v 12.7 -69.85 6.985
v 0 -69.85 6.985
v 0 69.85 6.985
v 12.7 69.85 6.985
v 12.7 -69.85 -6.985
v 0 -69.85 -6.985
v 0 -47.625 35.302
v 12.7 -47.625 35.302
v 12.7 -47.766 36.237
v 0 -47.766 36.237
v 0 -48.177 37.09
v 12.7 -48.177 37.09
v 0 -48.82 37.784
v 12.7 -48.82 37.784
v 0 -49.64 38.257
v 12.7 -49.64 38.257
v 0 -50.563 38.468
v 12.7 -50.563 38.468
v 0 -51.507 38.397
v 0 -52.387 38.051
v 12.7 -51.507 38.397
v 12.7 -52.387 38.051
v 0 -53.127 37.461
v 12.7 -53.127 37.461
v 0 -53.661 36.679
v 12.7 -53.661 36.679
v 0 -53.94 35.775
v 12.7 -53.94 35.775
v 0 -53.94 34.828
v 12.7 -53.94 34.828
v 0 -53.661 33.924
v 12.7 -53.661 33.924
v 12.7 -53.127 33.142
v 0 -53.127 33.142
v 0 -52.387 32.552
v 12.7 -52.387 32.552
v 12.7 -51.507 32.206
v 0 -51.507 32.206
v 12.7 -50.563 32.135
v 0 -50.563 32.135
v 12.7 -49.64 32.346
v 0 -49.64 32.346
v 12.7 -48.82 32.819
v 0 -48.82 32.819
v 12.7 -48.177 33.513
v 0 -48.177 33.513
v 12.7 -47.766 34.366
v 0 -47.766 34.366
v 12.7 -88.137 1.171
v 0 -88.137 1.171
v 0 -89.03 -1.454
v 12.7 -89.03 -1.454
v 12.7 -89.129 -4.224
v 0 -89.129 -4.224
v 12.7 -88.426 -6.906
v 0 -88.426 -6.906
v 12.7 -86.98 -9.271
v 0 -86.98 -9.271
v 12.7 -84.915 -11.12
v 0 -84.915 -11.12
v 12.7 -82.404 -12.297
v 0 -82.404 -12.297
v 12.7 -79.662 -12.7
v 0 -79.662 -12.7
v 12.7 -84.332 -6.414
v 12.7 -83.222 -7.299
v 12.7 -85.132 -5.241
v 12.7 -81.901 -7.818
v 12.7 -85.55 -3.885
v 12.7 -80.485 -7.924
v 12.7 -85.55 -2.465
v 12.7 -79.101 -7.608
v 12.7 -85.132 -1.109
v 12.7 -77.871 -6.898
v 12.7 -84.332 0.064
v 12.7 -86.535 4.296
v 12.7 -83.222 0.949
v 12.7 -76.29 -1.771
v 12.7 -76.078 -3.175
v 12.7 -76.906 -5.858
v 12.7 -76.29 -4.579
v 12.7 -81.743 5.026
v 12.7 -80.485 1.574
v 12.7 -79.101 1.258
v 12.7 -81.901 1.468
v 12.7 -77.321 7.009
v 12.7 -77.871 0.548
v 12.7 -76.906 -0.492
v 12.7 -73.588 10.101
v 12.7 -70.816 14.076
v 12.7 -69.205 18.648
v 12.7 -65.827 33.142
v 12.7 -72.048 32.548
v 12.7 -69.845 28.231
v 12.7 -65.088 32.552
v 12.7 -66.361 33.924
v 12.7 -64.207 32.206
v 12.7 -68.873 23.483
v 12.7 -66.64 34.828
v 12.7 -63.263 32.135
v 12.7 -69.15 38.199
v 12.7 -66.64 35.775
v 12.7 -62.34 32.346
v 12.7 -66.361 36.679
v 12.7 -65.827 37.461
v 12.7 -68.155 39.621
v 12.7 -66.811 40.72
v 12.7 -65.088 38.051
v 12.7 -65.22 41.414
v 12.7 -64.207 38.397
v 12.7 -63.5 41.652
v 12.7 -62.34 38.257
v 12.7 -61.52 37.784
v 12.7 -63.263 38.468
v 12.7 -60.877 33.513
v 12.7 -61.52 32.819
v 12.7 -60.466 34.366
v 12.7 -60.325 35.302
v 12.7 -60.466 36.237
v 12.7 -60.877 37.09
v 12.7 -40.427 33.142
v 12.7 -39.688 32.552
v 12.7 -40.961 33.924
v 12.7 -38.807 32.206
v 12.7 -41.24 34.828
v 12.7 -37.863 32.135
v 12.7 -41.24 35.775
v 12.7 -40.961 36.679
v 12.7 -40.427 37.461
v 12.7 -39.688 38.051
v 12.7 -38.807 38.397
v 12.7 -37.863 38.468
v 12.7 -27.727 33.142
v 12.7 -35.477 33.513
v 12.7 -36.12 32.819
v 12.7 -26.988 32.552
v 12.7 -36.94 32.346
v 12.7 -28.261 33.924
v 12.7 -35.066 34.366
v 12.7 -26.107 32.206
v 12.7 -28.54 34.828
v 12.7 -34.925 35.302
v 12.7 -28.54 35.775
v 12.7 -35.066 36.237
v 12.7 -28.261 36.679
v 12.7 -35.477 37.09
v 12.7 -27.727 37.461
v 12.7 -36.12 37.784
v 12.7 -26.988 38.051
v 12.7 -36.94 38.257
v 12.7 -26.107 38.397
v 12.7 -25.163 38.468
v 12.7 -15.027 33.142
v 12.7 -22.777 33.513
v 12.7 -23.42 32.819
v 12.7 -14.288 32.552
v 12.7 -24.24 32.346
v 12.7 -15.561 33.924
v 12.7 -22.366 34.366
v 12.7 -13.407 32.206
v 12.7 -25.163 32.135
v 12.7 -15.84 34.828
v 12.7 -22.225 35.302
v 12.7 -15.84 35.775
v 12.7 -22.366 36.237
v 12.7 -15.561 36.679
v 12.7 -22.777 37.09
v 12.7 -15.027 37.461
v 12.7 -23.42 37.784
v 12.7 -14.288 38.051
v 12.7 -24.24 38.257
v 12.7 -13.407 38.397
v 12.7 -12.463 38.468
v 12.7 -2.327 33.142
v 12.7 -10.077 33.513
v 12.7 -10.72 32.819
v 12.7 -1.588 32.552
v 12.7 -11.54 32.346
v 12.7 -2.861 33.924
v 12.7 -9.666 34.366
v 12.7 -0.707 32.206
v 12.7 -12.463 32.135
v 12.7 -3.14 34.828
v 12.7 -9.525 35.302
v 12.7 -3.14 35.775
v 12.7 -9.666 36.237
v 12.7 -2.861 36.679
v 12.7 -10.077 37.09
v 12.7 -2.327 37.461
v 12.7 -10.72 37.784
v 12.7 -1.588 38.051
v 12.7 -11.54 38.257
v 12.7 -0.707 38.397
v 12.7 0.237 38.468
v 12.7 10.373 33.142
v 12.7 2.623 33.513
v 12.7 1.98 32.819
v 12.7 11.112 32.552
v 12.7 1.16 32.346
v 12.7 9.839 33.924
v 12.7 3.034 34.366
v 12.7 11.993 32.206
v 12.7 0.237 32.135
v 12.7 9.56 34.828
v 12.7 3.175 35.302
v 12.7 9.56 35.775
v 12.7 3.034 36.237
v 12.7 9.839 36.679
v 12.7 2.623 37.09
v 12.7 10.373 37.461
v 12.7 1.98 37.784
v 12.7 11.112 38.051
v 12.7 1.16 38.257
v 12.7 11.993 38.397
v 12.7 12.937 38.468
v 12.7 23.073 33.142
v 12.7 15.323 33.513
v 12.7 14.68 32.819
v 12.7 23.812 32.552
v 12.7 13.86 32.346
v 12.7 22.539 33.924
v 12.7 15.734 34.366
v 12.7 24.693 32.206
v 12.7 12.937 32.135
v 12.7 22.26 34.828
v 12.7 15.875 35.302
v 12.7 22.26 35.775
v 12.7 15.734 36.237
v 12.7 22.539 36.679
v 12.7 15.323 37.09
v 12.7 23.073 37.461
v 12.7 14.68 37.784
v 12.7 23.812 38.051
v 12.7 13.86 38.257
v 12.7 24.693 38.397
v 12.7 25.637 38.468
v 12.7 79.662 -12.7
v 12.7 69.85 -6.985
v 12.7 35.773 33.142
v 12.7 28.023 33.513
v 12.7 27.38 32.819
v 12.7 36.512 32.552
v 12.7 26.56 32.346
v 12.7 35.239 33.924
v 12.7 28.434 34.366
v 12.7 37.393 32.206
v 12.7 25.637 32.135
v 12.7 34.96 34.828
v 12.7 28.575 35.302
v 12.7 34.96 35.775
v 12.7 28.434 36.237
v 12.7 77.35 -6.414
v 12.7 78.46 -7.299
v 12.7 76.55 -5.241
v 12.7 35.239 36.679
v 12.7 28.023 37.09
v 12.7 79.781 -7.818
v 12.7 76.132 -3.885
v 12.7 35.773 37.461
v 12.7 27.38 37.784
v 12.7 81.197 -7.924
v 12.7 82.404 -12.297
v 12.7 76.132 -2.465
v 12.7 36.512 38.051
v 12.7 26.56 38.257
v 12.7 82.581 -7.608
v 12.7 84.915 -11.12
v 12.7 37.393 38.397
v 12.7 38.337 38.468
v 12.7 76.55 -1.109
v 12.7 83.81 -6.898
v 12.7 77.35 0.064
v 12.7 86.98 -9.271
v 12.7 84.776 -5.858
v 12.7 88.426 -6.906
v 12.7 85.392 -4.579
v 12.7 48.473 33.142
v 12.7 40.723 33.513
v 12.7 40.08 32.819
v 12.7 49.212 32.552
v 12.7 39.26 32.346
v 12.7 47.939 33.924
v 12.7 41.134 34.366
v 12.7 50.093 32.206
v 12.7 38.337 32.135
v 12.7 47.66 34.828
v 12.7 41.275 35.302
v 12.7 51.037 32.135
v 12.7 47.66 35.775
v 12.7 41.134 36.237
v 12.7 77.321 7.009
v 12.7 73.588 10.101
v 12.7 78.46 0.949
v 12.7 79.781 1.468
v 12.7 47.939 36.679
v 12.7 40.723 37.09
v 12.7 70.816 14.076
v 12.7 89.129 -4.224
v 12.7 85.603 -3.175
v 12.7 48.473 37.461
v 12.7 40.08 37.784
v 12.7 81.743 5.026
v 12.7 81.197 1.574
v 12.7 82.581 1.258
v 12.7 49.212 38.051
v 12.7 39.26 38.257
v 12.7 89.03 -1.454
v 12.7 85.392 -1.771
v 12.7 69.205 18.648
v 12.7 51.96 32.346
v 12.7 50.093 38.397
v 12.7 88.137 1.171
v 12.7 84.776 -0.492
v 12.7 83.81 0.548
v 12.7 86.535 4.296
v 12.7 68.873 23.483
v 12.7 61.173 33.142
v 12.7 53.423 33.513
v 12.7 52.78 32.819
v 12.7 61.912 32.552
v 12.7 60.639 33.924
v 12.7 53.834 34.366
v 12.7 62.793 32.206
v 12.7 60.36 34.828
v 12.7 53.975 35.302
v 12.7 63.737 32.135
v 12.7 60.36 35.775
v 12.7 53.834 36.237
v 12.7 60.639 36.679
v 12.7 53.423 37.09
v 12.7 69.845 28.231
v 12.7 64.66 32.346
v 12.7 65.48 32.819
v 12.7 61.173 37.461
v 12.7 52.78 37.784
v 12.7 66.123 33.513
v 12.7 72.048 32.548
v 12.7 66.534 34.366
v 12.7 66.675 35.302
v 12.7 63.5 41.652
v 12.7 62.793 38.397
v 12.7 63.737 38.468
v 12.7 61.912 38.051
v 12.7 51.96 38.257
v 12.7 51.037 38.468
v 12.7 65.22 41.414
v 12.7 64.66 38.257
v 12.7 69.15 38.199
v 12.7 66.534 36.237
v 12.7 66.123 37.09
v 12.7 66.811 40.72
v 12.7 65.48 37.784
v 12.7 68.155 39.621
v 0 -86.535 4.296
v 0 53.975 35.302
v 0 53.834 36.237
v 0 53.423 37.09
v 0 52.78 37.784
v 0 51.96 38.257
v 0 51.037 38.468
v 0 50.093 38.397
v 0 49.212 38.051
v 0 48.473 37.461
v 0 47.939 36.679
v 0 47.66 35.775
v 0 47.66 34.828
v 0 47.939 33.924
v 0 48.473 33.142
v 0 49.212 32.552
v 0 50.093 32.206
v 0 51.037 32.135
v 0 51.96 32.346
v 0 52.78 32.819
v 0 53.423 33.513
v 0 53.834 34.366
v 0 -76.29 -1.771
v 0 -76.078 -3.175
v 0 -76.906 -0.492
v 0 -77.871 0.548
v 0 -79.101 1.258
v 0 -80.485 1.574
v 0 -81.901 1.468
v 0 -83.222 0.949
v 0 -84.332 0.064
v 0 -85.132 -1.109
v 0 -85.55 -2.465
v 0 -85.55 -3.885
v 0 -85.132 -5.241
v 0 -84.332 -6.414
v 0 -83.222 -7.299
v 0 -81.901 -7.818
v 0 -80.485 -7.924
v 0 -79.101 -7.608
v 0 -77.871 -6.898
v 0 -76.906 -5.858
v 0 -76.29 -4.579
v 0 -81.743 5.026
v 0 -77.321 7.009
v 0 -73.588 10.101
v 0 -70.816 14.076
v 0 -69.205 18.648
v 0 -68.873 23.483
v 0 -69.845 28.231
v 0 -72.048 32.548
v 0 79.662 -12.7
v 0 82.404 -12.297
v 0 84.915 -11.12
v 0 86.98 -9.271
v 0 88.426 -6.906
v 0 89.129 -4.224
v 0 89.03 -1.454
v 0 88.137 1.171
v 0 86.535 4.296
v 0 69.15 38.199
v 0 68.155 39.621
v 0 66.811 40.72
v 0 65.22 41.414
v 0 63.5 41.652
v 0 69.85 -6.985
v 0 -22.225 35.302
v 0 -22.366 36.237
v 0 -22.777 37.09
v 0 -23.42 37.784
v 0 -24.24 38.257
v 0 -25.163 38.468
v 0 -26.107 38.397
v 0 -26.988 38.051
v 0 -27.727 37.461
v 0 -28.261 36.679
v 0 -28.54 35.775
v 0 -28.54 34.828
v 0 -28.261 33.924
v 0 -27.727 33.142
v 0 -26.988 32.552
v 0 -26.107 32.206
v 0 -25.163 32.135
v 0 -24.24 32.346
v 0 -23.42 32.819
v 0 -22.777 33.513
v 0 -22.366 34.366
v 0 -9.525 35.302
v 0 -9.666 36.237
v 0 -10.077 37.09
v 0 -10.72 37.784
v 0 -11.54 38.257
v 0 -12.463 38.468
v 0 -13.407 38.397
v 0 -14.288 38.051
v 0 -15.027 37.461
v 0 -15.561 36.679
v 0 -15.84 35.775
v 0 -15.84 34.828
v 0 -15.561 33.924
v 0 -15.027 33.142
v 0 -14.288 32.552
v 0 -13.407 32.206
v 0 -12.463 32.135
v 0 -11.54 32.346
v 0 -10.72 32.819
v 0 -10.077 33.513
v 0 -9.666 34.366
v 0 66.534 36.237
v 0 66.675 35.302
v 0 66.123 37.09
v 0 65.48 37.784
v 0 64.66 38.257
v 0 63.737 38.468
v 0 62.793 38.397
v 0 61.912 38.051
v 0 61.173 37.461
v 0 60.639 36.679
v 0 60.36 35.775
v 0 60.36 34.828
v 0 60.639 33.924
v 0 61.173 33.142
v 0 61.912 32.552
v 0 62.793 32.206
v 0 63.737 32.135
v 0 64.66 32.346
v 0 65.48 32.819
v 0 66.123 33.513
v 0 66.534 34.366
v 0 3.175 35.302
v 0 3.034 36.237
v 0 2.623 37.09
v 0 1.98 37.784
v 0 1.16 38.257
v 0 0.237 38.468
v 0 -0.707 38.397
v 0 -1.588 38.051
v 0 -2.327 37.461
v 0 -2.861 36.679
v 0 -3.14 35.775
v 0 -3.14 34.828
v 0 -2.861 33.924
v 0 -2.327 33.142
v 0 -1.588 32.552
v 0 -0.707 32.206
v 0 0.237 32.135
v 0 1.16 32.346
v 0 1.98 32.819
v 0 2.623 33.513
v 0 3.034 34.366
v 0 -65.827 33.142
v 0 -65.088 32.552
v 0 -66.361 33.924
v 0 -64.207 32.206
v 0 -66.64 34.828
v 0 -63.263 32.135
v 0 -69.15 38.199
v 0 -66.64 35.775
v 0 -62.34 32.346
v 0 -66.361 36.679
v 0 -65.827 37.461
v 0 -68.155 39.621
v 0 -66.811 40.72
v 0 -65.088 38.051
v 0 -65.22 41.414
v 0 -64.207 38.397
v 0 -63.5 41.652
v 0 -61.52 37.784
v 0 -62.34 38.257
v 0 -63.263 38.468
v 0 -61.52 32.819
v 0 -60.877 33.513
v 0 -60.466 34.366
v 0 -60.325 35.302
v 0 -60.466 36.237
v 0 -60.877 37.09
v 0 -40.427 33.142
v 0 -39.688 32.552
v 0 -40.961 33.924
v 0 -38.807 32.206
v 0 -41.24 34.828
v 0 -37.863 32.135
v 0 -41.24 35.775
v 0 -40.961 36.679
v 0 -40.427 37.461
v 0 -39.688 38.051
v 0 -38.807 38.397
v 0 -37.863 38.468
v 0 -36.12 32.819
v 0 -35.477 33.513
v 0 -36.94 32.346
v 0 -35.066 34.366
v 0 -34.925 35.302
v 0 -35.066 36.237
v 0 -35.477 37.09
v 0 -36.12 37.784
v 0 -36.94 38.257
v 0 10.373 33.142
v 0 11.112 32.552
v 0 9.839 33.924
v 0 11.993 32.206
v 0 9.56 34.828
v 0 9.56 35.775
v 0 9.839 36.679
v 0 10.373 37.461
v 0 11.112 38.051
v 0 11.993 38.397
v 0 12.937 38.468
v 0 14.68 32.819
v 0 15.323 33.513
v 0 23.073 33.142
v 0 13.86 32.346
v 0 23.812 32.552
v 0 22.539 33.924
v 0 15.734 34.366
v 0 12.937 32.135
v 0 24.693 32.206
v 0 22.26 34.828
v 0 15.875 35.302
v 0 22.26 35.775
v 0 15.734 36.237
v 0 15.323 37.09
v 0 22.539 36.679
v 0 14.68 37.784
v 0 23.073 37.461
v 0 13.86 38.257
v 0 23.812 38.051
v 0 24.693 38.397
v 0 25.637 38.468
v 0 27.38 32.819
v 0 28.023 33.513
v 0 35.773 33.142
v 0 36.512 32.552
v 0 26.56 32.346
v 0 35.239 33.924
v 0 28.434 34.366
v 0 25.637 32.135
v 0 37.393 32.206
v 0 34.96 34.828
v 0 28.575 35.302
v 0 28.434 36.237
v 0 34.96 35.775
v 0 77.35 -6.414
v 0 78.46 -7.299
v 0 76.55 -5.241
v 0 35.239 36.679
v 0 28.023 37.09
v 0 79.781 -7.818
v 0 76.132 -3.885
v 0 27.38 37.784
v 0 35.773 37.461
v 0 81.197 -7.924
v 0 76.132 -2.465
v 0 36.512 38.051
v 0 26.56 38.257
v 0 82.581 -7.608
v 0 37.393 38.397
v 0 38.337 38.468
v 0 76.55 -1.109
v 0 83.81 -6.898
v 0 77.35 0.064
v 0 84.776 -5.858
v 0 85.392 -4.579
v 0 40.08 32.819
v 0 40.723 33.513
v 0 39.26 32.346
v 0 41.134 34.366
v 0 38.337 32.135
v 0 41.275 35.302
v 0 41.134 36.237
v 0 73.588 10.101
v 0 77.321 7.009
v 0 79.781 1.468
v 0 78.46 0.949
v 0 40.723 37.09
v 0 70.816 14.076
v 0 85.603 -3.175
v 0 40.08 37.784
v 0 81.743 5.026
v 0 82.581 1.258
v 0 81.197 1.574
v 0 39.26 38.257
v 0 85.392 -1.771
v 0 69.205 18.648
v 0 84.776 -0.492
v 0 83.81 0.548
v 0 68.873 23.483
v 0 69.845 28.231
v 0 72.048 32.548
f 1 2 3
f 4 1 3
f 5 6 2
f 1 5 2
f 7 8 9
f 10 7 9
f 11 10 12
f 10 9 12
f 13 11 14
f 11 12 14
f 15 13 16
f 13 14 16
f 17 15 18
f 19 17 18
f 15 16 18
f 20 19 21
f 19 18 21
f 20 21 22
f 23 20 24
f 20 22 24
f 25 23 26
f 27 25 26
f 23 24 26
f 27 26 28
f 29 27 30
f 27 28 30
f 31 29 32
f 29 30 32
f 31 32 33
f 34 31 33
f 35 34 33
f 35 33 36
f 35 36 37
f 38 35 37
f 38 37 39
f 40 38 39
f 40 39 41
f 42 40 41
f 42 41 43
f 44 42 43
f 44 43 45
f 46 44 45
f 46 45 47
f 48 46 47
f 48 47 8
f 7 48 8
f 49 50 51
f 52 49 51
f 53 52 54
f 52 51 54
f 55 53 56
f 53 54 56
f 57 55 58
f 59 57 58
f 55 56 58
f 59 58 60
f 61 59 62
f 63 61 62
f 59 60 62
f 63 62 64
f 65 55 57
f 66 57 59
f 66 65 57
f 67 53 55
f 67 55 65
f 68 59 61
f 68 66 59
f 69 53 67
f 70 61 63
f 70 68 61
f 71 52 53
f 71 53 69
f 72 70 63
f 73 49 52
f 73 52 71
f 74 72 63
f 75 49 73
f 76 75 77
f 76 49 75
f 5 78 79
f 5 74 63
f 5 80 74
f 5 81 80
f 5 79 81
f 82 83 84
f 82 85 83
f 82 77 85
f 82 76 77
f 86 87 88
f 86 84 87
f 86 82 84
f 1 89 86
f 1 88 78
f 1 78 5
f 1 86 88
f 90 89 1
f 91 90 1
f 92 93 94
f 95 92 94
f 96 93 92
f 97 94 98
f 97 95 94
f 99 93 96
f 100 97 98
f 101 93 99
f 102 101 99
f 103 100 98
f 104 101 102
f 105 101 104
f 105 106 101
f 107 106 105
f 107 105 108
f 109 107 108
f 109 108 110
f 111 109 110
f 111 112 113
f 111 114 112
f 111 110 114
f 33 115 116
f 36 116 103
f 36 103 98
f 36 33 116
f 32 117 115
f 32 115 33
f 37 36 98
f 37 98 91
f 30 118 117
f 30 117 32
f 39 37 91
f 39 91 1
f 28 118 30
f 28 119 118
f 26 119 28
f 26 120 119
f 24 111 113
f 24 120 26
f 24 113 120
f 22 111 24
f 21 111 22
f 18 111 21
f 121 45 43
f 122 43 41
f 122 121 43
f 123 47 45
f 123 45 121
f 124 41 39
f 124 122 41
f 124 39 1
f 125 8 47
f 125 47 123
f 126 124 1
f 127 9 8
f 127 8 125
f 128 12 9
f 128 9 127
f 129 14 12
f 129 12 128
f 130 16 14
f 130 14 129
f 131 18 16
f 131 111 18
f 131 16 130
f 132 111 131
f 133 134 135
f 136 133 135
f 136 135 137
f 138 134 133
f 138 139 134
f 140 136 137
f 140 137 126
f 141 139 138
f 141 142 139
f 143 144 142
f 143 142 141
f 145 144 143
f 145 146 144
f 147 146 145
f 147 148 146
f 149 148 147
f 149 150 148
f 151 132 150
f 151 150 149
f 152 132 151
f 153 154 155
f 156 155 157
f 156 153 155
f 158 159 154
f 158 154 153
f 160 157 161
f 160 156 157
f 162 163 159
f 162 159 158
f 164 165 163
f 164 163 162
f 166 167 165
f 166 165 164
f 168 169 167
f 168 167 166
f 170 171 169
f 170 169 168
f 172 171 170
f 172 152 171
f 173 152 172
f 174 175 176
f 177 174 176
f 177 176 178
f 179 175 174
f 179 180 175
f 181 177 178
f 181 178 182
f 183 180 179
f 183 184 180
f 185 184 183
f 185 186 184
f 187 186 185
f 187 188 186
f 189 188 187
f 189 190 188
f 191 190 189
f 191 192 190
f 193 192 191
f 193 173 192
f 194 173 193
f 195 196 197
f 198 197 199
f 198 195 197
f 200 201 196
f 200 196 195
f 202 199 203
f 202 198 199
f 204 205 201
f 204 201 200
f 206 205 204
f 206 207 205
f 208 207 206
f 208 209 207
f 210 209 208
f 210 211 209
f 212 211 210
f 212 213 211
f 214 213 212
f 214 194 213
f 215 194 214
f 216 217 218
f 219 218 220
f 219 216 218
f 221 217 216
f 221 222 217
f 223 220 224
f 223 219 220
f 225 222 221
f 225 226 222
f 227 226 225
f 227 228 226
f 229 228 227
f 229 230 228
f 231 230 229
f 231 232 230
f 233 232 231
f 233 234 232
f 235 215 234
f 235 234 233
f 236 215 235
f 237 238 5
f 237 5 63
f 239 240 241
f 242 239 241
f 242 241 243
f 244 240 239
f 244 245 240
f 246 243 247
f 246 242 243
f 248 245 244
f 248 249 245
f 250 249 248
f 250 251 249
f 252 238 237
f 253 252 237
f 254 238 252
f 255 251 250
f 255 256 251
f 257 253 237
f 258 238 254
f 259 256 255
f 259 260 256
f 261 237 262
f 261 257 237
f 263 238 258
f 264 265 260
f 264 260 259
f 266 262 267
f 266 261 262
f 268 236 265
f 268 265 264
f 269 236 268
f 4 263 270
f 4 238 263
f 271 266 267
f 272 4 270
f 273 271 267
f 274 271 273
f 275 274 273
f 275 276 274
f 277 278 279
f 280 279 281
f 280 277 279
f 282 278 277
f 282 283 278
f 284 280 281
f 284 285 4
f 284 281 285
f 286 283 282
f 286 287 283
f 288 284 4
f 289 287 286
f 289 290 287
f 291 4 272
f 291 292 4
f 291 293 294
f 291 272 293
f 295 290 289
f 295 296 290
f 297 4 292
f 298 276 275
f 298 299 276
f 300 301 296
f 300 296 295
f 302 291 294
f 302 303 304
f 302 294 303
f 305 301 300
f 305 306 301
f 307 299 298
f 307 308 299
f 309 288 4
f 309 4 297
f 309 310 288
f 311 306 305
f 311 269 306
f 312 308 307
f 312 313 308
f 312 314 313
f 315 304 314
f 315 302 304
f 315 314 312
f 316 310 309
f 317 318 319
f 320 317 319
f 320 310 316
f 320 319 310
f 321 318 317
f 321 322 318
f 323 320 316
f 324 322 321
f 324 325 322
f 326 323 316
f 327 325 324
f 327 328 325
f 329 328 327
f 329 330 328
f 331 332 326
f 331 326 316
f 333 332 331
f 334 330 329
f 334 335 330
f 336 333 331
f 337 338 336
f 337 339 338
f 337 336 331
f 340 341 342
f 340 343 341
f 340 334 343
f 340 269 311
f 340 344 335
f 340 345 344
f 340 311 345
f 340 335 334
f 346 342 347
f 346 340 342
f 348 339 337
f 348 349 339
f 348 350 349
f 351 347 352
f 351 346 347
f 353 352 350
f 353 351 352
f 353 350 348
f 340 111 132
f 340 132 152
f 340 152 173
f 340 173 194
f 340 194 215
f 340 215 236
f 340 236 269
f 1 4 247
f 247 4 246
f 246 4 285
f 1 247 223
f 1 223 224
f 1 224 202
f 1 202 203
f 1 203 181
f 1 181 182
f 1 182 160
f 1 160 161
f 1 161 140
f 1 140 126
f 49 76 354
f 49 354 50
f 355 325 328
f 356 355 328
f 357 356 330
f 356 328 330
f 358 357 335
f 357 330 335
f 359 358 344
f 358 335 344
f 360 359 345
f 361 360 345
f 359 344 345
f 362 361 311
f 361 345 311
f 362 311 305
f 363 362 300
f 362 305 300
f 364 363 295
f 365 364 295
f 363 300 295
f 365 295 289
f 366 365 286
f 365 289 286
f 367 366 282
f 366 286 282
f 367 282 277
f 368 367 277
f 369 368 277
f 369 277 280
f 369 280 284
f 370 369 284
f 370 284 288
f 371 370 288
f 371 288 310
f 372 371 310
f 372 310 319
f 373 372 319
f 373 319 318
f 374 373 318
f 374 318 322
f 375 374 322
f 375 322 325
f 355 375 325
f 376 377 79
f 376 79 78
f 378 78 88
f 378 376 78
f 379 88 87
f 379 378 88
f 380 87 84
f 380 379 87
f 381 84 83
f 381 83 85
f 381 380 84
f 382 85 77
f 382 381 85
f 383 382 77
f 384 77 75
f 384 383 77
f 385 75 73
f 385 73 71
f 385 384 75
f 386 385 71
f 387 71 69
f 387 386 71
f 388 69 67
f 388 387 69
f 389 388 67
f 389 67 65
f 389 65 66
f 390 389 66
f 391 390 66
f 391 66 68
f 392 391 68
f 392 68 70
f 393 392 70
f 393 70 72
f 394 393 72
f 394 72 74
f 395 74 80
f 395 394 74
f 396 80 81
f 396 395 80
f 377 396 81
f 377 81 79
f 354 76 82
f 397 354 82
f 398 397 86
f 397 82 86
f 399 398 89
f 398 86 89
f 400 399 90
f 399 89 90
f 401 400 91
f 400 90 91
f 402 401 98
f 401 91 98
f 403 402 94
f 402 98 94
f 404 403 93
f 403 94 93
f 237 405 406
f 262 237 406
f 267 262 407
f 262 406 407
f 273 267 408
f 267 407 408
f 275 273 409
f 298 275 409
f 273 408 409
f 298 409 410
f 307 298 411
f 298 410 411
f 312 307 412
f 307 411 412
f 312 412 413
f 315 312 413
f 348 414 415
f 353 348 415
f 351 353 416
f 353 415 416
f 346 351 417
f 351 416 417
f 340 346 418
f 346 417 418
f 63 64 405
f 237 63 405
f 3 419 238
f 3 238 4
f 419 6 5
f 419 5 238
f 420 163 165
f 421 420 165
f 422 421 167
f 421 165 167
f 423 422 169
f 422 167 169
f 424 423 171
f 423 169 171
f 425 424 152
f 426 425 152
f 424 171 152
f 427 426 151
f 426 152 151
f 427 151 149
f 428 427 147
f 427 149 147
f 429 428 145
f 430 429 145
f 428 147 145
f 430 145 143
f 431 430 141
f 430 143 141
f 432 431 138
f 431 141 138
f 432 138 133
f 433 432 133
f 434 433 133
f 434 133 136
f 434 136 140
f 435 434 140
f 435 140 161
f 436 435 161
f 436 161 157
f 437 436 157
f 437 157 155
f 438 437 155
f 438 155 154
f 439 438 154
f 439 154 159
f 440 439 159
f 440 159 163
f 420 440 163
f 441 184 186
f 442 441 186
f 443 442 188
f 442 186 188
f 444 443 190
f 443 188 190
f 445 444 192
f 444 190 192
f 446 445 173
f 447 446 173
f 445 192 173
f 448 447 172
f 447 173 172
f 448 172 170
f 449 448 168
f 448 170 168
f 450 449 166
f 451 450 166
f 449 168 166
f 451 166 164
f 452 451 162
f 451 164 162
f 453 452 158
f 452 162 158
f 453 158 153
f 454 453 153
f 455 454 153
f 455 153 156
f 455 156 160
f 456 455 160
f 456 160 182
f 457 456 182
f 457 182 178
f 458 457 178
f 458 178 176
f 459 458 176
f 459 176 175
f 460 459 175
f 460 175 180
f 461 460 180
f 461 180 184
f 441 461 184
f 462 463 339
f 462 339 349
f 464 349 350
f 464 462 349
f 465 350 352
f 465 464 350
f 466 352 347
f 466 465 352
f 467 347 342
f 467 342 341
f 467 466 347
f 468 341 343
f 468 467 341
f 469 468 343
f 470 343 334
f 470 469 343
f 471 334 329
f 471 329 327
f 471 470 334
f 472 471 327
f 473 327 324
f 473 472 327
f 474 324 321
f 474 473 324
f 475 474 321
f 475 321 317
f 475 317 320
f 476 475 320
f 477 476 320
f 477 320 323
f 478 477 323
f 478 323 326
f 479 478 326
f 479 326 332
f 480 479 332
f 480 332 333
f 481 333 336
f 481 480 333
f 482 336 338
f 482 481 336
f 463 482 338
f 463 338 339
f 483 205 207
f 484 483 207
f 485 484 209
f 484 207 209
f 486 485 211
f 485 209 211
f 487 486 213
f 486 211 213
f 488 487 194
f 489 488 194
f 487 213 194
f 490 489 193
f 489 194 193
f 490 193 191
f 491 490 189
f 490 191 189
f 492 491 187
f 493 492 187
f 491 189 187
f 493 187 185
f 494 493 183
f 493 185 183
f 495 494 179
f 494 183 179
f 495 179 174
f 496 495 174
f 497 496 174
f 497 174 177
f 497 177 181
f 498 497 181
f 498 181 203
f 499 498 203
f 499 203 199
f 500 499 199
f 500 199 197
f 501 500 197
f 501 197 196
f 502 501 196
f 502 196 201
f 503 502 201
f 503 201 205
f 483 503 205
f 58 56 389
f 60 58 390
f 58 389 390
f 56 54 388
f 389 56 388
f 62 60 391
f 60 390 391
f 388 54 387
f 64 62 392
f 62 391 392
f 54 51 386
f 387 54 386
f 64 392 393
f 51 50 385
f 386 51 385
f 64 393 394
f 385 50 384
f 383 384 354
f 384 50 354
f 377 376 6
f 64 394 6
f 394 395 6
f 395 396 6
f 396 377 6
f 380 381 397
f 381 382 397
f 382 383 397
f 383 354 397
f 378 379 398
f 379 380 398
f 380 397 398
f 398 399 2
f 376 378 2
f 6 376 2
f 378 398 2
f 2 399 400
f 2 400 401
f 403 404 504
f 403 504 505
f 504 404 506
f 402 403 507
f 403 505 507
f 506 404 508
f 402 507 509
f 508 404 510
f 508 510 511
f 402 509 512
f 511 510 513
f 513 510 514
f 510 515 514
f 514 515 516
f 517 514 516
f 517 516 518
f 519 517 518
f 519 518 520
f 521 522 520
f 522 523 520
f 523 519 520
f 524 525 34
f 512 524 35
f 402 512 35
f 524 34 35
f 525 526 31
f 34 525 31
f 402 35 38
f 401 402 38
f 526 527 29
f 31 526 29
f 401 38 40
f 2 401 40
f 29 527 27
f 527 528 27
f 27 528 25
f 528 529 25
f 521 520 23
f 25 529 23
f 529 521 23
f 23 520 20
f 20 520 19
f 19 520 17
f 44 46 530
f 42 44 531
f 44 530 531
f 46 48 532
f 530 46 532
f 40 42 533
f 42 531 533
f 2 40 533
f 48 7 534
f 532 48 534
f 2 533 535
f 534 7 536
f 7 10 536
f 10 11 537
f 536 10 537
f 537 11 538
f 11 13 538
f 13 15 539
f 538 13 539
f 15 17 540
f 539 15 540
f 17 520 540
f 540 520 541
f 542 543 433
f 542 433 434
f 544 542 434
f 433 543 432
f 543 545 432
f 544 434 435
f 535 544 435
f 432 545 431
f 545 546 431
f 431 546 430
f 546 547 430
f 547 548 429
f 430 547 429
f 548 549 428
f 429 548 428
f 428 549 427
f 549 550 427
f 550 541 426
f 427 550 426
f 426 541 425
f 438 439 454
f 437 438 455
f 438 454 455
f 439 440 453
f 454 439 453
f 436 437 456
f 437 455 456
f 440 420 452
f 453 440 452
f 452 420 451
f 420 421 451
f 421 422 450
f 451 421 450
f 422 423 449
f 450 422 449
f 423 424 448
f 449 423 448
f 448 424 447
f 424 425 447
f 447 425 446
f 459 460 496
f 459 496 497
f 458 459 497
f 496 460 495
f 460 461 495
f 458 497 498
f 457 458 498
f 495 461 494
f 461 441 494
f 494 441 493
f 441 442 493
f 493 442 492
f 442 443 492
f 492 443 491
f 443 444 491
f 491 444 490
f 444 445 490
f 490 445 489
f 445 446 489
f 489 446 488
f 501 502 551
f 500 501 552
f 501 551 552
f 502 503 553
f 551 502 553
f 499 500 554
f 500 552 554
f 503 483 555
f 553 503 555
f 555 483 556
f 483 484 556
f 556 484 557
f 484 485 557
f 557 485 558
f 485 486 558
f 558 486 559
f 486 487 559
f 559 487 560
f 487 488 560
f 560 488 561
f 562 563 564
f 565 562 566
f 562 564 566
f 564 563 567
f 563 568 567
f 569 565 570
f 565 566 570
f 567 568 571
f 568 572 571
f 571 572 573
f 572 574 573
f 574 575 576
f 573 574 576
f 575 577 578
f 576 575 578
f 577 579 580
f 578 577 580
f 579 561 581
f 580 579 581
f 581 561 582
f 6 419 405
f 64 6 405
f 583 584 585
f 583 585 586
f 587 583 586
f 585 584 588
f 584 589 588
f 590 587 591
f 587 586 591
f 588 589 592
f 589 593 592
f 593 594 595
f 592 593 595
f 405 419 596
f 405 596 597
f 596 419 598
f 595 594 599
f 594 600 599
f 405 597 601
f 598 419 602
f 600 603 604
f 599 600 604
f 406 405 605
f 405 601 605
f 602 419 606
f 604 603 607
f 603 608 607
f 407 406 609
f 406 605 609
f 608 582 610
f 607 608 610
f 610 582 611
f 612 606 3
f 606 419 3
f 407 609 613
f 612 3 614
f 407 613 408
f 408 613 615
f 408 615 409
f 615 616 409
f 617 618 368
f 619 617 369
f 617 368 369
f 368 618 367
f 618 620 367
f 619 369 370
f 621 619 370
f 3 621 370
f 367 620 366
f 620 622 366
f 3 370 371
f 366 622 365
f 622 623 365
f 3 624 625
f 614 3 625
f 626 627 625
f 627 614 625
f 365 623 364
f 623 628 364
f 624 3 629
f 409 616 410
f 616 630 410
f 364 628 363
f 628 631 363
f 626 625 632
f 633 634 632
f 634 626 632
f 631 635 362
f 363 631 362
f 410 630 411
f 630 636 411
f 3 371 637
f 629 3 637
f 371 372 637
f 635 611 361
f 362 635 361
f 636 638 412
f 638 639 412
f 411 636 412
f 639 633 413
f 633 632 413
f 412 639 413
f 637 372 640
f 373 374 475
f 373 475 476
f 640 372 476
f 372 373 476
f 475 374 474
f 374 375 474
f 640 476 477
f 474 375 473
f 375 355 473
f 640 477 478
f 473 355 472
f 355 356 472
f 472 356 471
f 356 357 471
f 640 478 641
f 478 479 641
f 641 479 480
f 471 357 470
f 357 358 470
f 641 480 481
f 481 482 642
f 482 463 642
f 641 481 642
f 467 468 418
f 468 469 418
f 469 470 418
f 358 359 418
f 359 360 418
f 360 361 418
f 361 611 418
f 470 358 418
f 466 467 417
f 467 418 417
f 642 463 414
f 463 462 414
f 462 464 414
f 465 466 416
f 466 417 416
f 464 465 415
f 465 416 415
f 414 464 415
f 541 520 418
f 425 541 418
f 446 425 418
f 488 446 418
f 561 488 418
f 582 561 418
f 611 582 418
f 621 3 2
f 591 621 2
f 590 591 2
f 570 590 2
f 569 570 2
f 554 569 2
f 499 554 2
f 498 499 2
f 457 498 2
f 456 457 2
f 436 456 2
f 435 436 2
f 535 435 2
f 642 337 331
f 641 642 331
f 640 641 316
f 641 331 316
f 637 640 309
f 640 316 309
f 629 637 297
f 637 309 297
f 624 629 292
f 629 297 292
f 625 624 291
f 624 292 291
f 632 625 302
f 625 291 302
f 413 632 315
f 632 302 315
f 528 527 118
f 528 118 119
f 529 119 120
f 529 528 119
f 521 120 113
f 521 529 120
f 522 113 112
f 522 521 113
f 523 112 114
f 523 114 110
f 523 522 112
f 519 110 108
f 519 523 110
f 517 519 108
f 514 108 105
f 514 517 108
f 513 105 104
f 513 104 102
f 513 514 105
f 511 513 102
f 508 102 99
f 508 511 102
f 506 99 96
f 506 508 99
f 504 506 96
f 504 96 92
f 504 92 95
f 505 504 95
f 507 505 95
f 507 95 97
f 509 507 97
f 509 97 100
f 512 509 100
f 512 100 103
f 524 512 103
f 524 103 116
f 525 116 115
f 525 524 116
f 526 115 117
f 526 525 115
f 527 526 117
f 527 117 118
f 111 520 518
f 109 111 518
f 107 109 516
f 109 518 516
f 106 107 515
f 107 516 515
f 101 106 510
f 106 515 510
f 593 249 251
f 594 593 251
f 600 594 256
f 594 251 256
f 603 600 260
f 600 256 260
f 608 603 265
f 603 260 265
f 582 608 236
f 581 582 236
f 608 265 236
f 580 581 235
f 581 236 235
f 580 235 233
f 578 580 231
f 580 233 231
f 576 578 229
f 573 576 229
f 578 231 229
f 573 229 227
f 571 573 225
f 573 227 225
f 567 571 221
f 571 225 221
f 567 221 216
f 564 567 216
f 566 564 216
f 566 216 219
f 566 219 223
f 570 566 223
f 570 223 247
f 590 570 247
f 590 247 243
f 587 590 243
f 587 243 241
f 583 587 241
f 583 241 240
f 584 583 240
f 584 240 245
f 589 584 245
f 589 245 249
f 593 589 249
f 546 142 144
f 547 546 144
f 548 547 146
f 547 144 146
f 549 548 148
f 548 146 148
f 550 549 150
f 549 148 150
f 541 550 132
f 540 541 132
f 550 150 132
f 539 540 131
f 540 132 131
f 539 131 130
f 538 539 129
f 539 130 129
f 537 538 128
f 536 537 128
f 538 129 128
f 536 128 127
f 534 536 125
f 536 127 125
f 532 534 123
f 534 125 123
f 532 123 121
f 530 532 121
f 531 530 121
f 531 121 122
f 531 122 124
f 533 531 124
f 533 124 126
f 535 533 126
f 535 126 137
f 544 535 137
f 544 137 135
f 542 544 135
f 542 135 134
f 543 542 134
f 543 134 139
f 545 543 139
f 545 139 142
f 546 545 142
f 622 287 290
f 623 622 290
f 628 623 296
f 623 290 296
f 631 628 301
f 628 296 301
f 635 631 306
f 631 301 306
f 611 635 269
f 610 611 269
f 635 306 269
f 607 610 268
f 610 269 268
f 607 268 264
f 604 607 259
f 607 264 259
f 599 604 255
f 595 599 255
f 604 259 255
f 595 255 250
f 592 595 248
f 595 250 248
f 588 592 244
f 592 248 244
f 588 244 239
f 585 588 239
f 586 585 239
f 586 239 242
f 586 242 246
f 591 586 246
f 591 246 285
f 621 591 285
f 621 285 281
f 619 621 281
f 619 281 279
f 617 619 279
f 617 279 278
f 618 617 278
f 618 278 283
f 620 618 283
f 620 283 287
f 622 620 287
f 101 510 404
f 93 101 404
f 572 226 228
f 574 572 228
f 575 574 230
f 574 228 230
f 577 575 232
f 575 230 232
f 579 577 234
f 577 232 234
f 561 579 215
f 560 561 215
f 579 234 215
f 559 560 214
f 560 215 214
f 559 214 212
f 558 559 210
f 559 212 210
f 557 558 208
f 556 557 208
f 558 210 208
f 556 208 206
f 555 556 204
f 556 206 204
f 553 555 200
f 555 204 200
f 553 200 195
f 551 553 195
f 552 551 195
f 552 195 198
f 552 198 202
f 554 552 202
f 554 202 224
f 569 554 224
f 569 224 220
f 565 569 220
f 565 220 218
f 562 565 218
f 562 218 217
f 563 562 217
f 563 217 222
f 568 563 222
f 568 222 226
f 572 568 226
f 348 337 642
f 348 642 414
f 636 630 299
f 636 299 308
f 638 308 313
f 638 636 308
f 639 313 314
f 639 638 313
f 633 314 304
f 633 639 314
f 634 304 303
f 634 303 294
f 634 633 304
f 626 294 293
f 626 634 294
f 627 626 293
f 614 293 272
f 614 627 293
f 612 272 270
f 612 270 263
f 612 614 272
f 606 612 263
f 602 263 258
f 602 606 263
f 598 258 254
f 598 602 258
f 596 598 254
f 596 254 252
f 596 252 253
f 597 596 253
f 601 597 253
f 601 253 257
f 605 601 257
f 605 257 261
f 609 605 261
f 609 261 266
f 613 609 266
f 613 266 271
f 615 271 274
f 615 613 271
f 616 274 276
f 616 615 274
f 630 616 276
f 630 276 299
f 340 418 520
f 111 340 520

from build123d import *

# Parameters (mm, degrees)
F0_R     = 4.7625
F0_W     = 139.7
F0_H     = 13.97
F0_R_2   = 3.175
F1_DEPTH = 12.7
F3_DEPTH = 25.4
F4_R     = 3.175
F5_DEPTH = 25.4


with BuildPart() as f1:
    # F0 (on Right) → F1 (new body)
    with BuildSketch(Plane.YZ):
        with BuildLine():
            Line((-79.661611154, -12.7), (79.661611154, -12.7))
            ThreePointArc((79.661611154, -12.7), (87.7894077283, -8.1413414953), (88.1372885066, 1.1710923155))
            Line((88.1372885066, 1.1710923155), (69.1504515684, 38.1989076845))
            ThreePointArc((69.1504515684, 38.1989076845), (66.8108943302, 40.720043857), (63.5, 41.6515128075))
            Line((63.5, 41.6515128075), (-63.5, 41.6515128075))
            ThreePointArc((-63.5, 41.6515128075), (-66.8108943302, 40.720043857), (-69.1504515684, 38.1989076845))
            Line((-69.1504515684, 38.1989076845), (-88.1372885066, 1.1710923155))
            ThreePointArc((-88.1372885066, 1.1710923155), (-87.7894077283, -8.1413414953), (-79.661611154, -12.7))
        make_face()
        with Locations((-80.8408441287, -3.175)):
            Circle(F0_R, mode=Mode.SUBTRACT)
        Rectangle(F0_W, F0_H, mode=Mode.SUBTRACT)
        with Locations((80.8408441287, -3.175)):
            Circle(F0_R, mode=Mode.SUBTRACT)
        with Locations((-63.5, 35.3015128075)):
            Circle(F0_R_2, mode=Mode.SUBTRACT)
        with Locations((63.5, 35.3015128075)):
            Circle(F0_R_2, mode=Mode.SUBTRACT)
    extrude(amount=F1_DEPTH)

    # F2 (on face) → F3 (cut)
    with BuildSketch(Plane.YZ.offset(12.7)):
        with BuildLine():
            Line((-72.0478464454, 32.5484561161), (-86.5348208304, 4.2961982741))
            ThreePointArc((-86.5348208304, 4.2961982741), (-70.8156562853, 14.0762348796), (-72.0478464454, 32.5484561161))
        make_face()
        with BuildLine():
            ThreePointArc((72.0478464454, 32.5484561161), (70.8156562853, 14.0762348796), (86.5348208304, 4.2961982741))
            Line((86.5348208304, 4.2961982741), (72.0478464454, 32.5484561161))
        make_face()
    extrude(amount=-F3_DEPTH, mode=Mode.SUBTRACT)

    # F4 (on face) → F5 (cut)
    with BuildSketch(Plane.YZ.offset(12.7)):
        with Locations((-50.8, 35.3015128075)):
            Circle(F4_R)
        with Locations((-38.1, 35.3015128075)):
            Circle(F4_R)
        with Locations((-25.4, 35.3015128075)):
            Circle(F4_R)
        with Locations((-12.7, 35.3015128075)):
            Circle(F4_R)
        with Locations((0, 35.3015128075)):
            Circle(F4_R)
        with Locations((12.7, 35.3015128075)):
            Circle(F4_R)
        with Locations((25.4, 35.3015128075)):
            Circle(F4_R)
        with Locations((38.1, 35.3015128075)):
            Circle(F4_R)
        with Locations((50.8, 35.3015128075)):
            Circle(F4_R)
        with Locations((63.5, 35.3015128075)):
            Circle(F4_R)
    extrude(amount=-F5_DEPTH, mode=Mode.SUBTRACT)


solid = f1.part
